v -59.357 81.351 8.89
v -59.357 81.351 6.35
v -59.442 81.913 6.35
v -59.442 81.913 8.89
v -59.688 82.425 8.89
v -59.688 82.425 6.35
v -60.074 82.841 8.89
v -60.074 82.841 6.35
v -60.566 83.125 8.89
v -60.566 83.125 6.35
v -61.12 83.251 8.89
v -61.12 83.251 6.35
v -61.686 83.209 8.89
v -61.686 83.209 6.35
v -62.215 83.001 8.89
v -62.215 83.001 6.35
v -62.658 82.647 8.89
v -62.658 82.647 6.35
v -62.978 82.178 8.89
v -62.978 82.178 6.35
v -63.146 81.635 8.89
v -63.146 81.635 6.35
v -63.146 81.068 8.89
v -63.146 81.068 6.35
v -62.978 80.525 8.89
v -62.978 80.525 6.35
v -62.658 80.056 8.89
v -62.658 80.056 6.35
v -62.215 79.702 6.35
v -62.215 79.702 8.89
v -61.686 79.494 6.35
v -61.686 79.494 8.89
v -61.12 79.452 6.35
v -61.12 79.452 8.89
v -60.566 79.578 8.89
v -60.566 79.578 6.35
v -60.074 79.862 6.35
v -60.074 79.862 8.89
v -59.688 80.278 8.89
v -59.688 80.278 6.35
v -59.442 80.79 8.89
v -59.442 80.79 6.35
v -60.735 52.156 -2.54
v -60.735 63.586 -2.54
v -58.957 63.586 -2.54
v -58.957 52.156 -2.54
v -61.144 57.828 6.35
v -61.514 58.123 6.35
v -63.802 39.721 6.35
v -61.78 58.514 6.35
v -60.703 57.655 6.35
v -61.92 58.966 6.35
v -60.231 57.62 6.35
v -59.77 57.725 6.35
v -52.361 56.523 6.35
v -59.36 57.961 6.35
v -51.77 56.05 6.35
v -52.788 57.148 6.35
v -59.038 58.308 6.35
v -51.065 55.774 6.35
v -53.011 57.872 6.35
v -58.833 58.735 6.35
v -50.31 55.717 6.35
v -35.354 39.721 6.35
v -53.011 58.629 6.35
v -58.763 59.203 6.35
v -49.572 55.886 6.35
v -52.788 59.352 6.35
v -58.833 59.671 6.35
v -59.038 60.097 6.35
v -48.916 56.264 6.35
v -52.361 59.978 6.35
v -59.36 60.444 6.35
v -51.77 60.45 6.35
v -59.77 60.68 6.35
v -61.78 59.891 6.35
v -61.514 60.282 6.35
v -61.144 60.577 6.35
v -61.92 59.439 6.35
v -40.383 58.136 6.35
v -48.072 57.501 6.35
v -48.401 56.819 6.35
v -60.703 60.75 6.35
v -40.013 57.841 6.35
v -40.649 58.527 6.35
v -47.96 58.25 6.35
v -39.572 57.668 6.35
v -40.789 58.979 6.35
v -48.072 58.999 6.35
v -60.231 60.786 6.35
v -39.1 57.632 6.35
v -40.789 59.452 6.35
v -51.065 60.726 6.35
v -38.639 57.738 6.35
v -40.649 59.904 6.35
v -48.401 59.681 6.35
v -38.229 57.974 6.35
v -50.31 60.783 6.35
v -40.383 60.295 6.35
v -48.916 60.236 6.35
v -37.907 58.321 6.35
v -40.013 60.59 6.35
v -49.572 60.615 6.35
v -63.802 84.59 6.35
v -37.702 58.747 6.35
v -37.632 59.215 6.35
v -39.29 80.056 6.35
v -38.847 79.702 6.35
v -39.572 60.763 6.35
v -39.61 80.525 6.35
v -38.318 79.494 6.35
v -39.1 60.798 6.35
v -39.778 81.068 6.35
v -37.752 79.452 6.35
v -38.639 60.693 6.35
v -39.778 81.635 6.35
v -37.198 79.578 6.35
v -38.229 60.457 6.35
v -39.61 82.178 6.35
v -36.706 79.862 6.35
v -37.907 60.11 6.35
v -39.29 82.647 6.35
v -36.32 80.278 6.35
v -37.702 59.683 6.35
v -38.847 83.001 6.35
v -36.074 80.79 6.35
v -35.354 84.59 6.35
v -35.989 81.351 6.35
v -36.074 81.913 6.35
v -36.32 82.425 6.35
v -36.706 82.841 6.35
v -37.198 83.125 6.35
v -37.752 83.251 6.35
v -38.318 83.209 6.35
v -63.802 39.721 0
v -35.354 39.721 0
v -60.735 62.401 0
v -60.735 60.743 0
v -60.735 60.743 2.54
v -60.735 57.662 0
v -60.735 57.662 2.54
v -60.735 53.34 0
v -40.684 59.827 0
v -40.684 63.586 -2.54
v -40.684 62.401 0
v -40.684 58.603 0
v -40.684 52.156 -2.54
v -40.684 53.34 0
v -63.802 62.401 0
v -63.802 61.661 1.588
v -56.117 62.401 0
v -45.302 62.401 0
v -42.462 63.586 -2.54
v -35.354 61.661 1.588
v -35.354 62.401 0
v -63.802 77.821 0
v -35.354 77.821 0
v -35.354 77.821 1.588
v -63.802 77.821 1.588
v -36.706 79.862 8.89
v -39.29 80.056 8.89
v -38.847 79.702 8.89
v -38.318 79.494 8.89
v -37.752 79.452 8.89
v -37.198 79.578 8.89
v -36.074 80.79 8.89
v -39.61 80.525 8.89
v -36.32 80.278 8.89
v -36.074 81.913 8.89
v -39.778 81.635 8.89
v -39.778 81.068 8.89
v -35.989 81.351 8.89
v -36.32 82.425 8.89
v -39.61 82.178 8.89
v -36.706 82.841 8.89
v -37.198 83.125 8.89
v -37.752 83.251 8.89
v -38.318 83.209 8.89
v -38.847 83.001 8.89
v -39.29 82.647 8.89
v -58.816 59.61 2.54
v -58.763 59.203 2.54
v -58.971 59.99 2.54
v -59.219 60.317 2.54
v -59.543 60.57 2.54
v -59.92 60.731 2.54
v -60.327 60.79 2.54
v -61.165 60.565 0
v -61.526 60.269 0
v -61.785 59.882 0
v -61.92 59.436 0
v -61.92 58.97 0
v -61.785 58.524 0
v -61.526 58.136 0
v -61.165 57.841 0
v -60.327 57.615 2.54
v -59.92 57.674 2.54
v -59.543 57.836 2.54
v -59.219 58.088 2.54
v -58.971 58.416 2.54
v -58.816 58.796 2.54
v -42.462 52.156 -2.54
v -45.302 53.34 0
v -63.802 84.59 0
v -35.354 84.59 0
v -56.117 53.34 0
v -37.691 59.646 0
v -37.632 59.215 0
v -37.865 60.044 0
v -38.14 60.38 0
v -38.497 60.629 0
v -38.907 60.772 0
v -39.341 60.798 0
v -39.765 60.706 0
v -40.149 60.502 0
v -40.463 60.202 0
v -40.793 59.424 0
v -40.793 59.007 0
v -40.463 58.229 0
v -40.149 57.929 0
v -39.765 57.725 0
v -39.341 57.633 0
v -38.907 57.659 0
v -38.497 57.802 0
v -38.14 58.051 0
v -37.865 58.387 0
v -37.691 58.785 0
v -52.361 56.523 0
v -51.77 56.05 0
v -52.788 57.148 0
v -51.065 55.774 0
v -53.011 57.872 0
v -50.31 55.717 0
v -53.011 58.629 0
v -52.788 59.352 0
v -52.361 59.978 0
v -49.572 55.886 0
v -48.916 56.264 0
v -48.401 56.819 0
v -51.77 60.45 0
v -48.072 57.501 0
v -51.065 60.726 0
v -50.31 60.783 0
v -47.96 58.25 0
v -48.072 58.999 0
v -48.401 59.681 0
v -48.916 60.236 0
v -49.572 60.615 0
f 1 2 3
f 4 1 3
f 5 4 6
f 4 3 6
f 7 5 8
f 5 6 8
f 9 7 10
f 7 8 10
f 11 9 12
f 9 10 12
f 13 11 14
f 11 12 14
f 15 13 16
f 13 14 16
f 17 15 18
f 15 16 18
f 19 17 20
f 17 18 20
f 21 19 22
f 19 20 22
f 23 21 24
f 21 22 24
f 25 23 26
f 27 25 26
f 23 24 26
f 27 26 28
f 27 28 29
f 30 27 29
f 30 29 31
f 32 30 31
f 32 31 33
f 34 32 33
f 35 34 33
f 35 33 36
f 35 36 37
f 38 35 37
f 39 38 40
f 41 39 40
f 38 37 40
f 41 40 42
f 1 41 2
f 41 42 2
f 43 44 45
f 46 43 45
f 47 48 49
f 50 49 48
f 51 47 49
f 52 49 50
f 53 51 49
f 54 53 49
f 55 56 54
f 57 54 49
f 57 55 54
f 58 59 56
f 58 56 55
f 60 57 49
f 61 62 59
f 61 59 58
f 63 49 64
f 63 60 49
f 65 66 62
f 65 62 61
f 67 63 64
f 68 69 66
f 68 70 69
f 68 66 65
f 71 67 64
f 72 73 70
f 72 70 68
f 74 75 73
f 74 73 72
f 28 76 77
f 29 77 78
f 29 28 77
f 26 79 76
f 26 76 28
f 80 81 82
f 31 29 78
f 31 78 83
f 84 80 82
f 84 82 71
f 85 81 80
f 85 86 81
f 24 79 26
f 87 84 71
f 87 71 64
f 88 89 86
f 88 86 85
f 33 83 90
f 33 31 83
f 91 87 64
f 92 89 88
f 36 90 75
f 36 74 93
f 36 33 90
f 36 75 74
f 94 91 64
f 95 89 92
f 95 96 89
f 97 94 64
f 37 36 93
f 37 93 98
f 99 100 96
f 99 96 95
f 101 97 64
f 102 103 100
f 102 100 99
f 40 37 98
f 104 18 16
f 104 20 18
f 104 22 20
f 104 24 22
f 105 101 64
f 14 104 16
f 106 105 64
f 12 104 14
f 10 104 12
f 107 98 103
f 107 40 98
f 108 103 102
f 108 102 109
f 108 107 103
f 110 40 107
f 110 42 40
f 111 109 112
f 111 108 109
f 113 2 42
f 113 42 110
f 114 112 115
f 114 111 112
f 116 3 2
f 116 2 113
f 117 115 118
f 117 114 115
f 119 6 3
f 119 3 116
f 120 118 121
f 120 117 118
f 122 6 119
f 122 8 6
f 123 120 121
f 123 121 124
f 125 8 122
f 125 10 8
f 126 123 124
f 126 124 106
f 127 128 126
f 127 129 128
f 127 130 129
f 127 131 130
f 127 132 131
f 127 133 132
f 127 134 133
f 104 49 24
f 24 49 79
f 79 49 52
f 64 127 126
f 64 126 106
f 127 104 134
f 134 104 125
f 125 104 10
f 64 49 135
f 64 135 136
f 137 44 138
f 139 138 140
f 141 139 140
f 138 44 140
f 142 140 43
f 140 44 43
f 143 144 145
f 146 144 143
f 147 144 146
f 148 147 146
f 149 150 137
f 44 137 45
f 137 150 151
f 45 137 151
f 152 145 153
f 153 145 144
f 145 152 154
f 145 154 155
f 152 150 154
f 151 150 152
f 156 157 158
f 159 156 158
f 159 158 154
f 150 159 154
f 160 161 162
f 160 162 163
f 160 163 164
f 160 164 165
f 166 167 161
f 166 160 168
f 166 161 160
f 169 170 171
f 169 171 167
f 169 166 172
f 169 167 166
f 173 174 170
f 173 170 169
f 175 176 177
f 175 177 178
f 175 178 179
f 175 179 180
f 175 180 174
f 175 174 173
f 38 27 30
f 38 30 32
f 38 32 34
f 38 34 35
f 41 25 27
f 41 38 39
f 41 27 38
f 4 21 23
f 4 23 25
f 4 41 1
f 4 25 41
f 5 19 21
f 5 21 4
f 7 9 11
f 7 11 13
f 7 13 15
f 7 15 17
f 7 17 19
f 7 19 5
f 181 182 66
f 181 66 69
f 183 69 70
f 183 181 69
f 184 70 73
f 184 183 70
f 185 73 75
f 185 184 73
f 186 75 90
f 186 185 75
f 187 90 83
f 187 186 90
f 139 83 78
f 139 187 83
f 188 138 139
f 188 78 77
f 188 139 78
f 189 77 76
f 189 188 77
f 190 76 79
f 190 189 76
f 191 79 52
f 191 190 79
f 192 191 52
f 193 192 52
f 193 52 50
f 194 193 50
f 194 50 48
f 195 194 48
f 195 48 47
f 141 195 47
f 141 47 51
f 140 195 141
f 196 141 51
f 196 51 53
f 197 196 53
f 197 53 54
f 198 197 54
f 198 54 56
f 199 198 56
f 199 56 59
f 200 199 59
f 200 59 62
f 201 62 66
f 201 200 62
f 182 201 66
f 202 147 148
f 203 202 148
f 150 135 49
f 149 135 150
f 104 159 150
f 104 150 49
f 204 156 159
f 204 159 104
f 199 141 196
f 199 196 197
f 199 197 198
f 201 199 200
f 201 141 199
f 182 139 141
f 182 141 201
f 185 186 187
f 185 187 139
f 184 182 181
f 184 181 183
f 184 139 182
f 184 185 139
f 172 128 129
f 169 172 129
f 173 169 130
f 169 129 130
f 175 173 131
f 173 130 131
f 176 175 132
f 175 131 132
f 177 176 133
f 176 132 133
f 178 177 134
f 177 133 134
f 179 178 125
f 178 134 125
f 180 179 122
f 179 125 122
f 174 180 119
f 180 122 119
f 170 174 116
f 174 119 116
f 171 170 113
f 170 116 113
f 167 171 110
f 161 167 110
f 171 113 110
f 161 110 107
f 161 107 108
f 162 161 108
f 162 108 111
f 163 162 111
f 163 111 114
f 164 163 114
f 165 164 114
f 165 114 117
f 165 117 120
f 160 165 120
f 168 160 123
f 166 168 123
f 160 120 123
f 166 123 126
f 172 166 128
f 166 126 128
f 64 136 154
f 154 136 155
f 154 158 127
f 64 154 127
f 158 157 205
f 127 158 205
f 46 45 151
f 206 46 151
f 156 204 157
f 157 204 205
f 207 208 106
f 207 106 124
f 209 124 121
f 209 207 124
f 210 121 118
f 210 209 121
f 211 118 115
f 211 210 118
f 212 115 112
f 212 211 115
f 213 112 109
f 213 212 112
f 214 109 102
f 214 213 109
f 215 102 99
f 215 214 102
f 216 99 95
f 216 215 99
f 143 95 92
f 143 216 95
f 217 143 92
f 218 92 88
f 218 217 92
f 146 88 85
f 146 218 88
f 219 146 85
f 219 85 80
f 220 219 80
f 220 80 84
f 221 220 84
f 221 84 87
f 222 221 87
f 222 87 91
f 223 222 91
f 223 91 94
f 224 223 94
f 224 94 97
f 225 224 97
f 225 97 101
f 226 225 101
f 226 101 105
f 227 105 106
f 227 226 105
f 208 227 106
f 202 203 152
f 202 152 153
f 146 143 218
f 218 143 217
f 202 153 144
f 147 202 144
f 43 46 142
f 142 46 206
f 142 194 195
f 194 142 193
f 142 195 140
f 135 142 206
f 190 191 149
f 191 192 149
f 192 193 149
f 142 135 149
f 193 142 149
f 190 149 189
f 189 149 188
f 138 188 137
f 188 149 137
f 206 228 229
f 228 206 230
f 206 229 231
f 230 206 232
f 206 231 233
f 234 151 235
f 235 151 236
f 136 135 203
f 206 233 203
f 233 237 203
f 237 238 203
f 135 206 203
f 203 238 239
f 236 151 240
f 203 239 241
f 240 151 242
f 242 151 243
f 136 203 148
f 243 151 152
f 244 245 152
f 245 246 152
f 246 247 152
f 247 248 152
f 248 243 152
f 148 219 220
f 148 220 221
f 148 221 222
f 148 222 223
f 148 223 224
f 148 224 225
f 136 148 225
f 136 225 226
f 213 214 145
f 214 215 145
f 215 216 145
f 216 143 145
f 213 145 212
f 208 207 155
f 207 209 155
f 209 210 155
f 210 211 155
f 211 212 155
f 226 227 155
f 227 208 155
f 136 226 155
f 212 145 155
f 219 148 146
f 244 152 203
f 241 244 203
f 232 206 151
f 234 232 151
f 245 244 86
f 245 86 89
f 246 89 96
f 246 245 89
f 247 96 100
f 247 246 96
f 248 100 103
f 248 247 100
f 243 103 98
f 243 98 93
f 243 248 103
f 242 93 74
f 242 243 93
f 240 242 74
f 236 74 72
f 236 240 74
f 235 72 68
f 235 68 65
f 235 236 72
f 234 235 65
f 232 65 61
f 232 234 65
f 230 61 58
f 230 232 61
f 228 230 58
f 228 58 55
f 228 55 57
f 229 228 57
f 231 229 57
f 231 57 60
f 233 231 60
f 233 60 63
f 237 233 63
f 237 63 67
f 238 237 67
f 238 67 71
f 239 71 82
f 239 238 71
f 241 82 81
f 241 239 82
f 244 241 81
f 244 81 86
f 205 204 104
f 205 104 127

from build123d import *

# Parameters (mm, degrees)
F0_W     = 28.448
F0_H     = 44.8691
F0_R     = 1.5875
F0_R_2   = 2.54
F1_DEPTH = 6.35
F3_DEPTH = 38.1
F5_DEPTH = 50.8
F6_R     = 1.905
F7_DEPTH = 2.54


with BuildPart() as f1:
    # F0 (on Top) → F1 (new body)
    with BuildSketch(Plane.XY):
        with Locations((-49.5780322009, 62.1553933926)):
            Rectangle(F0_W, F0_H)
        with Locations((-60.3500753641, 59.2026433926)):
            Circle(F0_R, mode=Mode.SUBTRACT)
        with Locations((-50.499536097, 58.2501433926)):
            Circle(F0_R_2, mode=Mode.SUBTRACT)
        with Locations((-39.2191149294, 59.2153433926)):
            Circle(F0_R, mode=Mode.SUBTRACT)
    extrude(amount=F1_DEPTH)

    # F2 (on face) → F3 (join)
    with BuildSketch(Plane.XZ.offset(-39.7208433926)):
        Polygon((-56.1168316064, 0), (-60.7346379378, 0), (-60.7346379378, -2.54), (-58.9566379378, -2.54), align=None)
        Polygon((-40.6839104433, 0), (-45.3017167747, 0), (-42.4619104433, -2.54), (-40.6839104433, -2.54), align=None)
    extrude(amount=-F3_DEPTH)

    # F4 (on face) → F5 (cut)
    with BuildSketch(Plane.YZ.offset(-35.3540322009)):
        Polygon((63.5858905178, -2.54), (77.8208433926, -2.54), (77.8208433926, 1.5875), (61.6612056587, 1.5875), align=None)
        Polygon((39.7208433926, 0), (39.7208433926, -2.54), (52.1558905178, -2.54), (53.3403119695, 0), align=None)
    extrude(amount=-F5_DEPTH, mode=Mode.SUBTRACT)

    # F6 (on face) + F3_face (on face) → F7 (join)
    with BuildSketch(Plane.XY.offset(6.35)):
        with Locations((-61.2620322009, 81.3514433926)):
            Circle(F6_R)
        with Locations((-37.8940322009, 81.3514433926)):
            Circle(F6_R)
    with BuildSketch(Plane(origin=(-59.8787005815, 59.2026433926, 0), x_dir=(1, 0, 0), z_dir=(0, 0, 1))):
        with BuildLine():
            Line((-0.8559373563, 1.5402168279), (-0.8559373563, -1.5402168279))
            ThreePointArc((-0.8559373563, -1.5402168279), (0.5057800578, -1.251129357), (1.1161252174, 0))
            ThreePointArc((1.1161252174, 0), (0.5057800578, 1.251129357), (-0.8559373563, 1.5402168279))
        make_face()
    extrude(amount=F7_DEPTH)


solid = f1.part
